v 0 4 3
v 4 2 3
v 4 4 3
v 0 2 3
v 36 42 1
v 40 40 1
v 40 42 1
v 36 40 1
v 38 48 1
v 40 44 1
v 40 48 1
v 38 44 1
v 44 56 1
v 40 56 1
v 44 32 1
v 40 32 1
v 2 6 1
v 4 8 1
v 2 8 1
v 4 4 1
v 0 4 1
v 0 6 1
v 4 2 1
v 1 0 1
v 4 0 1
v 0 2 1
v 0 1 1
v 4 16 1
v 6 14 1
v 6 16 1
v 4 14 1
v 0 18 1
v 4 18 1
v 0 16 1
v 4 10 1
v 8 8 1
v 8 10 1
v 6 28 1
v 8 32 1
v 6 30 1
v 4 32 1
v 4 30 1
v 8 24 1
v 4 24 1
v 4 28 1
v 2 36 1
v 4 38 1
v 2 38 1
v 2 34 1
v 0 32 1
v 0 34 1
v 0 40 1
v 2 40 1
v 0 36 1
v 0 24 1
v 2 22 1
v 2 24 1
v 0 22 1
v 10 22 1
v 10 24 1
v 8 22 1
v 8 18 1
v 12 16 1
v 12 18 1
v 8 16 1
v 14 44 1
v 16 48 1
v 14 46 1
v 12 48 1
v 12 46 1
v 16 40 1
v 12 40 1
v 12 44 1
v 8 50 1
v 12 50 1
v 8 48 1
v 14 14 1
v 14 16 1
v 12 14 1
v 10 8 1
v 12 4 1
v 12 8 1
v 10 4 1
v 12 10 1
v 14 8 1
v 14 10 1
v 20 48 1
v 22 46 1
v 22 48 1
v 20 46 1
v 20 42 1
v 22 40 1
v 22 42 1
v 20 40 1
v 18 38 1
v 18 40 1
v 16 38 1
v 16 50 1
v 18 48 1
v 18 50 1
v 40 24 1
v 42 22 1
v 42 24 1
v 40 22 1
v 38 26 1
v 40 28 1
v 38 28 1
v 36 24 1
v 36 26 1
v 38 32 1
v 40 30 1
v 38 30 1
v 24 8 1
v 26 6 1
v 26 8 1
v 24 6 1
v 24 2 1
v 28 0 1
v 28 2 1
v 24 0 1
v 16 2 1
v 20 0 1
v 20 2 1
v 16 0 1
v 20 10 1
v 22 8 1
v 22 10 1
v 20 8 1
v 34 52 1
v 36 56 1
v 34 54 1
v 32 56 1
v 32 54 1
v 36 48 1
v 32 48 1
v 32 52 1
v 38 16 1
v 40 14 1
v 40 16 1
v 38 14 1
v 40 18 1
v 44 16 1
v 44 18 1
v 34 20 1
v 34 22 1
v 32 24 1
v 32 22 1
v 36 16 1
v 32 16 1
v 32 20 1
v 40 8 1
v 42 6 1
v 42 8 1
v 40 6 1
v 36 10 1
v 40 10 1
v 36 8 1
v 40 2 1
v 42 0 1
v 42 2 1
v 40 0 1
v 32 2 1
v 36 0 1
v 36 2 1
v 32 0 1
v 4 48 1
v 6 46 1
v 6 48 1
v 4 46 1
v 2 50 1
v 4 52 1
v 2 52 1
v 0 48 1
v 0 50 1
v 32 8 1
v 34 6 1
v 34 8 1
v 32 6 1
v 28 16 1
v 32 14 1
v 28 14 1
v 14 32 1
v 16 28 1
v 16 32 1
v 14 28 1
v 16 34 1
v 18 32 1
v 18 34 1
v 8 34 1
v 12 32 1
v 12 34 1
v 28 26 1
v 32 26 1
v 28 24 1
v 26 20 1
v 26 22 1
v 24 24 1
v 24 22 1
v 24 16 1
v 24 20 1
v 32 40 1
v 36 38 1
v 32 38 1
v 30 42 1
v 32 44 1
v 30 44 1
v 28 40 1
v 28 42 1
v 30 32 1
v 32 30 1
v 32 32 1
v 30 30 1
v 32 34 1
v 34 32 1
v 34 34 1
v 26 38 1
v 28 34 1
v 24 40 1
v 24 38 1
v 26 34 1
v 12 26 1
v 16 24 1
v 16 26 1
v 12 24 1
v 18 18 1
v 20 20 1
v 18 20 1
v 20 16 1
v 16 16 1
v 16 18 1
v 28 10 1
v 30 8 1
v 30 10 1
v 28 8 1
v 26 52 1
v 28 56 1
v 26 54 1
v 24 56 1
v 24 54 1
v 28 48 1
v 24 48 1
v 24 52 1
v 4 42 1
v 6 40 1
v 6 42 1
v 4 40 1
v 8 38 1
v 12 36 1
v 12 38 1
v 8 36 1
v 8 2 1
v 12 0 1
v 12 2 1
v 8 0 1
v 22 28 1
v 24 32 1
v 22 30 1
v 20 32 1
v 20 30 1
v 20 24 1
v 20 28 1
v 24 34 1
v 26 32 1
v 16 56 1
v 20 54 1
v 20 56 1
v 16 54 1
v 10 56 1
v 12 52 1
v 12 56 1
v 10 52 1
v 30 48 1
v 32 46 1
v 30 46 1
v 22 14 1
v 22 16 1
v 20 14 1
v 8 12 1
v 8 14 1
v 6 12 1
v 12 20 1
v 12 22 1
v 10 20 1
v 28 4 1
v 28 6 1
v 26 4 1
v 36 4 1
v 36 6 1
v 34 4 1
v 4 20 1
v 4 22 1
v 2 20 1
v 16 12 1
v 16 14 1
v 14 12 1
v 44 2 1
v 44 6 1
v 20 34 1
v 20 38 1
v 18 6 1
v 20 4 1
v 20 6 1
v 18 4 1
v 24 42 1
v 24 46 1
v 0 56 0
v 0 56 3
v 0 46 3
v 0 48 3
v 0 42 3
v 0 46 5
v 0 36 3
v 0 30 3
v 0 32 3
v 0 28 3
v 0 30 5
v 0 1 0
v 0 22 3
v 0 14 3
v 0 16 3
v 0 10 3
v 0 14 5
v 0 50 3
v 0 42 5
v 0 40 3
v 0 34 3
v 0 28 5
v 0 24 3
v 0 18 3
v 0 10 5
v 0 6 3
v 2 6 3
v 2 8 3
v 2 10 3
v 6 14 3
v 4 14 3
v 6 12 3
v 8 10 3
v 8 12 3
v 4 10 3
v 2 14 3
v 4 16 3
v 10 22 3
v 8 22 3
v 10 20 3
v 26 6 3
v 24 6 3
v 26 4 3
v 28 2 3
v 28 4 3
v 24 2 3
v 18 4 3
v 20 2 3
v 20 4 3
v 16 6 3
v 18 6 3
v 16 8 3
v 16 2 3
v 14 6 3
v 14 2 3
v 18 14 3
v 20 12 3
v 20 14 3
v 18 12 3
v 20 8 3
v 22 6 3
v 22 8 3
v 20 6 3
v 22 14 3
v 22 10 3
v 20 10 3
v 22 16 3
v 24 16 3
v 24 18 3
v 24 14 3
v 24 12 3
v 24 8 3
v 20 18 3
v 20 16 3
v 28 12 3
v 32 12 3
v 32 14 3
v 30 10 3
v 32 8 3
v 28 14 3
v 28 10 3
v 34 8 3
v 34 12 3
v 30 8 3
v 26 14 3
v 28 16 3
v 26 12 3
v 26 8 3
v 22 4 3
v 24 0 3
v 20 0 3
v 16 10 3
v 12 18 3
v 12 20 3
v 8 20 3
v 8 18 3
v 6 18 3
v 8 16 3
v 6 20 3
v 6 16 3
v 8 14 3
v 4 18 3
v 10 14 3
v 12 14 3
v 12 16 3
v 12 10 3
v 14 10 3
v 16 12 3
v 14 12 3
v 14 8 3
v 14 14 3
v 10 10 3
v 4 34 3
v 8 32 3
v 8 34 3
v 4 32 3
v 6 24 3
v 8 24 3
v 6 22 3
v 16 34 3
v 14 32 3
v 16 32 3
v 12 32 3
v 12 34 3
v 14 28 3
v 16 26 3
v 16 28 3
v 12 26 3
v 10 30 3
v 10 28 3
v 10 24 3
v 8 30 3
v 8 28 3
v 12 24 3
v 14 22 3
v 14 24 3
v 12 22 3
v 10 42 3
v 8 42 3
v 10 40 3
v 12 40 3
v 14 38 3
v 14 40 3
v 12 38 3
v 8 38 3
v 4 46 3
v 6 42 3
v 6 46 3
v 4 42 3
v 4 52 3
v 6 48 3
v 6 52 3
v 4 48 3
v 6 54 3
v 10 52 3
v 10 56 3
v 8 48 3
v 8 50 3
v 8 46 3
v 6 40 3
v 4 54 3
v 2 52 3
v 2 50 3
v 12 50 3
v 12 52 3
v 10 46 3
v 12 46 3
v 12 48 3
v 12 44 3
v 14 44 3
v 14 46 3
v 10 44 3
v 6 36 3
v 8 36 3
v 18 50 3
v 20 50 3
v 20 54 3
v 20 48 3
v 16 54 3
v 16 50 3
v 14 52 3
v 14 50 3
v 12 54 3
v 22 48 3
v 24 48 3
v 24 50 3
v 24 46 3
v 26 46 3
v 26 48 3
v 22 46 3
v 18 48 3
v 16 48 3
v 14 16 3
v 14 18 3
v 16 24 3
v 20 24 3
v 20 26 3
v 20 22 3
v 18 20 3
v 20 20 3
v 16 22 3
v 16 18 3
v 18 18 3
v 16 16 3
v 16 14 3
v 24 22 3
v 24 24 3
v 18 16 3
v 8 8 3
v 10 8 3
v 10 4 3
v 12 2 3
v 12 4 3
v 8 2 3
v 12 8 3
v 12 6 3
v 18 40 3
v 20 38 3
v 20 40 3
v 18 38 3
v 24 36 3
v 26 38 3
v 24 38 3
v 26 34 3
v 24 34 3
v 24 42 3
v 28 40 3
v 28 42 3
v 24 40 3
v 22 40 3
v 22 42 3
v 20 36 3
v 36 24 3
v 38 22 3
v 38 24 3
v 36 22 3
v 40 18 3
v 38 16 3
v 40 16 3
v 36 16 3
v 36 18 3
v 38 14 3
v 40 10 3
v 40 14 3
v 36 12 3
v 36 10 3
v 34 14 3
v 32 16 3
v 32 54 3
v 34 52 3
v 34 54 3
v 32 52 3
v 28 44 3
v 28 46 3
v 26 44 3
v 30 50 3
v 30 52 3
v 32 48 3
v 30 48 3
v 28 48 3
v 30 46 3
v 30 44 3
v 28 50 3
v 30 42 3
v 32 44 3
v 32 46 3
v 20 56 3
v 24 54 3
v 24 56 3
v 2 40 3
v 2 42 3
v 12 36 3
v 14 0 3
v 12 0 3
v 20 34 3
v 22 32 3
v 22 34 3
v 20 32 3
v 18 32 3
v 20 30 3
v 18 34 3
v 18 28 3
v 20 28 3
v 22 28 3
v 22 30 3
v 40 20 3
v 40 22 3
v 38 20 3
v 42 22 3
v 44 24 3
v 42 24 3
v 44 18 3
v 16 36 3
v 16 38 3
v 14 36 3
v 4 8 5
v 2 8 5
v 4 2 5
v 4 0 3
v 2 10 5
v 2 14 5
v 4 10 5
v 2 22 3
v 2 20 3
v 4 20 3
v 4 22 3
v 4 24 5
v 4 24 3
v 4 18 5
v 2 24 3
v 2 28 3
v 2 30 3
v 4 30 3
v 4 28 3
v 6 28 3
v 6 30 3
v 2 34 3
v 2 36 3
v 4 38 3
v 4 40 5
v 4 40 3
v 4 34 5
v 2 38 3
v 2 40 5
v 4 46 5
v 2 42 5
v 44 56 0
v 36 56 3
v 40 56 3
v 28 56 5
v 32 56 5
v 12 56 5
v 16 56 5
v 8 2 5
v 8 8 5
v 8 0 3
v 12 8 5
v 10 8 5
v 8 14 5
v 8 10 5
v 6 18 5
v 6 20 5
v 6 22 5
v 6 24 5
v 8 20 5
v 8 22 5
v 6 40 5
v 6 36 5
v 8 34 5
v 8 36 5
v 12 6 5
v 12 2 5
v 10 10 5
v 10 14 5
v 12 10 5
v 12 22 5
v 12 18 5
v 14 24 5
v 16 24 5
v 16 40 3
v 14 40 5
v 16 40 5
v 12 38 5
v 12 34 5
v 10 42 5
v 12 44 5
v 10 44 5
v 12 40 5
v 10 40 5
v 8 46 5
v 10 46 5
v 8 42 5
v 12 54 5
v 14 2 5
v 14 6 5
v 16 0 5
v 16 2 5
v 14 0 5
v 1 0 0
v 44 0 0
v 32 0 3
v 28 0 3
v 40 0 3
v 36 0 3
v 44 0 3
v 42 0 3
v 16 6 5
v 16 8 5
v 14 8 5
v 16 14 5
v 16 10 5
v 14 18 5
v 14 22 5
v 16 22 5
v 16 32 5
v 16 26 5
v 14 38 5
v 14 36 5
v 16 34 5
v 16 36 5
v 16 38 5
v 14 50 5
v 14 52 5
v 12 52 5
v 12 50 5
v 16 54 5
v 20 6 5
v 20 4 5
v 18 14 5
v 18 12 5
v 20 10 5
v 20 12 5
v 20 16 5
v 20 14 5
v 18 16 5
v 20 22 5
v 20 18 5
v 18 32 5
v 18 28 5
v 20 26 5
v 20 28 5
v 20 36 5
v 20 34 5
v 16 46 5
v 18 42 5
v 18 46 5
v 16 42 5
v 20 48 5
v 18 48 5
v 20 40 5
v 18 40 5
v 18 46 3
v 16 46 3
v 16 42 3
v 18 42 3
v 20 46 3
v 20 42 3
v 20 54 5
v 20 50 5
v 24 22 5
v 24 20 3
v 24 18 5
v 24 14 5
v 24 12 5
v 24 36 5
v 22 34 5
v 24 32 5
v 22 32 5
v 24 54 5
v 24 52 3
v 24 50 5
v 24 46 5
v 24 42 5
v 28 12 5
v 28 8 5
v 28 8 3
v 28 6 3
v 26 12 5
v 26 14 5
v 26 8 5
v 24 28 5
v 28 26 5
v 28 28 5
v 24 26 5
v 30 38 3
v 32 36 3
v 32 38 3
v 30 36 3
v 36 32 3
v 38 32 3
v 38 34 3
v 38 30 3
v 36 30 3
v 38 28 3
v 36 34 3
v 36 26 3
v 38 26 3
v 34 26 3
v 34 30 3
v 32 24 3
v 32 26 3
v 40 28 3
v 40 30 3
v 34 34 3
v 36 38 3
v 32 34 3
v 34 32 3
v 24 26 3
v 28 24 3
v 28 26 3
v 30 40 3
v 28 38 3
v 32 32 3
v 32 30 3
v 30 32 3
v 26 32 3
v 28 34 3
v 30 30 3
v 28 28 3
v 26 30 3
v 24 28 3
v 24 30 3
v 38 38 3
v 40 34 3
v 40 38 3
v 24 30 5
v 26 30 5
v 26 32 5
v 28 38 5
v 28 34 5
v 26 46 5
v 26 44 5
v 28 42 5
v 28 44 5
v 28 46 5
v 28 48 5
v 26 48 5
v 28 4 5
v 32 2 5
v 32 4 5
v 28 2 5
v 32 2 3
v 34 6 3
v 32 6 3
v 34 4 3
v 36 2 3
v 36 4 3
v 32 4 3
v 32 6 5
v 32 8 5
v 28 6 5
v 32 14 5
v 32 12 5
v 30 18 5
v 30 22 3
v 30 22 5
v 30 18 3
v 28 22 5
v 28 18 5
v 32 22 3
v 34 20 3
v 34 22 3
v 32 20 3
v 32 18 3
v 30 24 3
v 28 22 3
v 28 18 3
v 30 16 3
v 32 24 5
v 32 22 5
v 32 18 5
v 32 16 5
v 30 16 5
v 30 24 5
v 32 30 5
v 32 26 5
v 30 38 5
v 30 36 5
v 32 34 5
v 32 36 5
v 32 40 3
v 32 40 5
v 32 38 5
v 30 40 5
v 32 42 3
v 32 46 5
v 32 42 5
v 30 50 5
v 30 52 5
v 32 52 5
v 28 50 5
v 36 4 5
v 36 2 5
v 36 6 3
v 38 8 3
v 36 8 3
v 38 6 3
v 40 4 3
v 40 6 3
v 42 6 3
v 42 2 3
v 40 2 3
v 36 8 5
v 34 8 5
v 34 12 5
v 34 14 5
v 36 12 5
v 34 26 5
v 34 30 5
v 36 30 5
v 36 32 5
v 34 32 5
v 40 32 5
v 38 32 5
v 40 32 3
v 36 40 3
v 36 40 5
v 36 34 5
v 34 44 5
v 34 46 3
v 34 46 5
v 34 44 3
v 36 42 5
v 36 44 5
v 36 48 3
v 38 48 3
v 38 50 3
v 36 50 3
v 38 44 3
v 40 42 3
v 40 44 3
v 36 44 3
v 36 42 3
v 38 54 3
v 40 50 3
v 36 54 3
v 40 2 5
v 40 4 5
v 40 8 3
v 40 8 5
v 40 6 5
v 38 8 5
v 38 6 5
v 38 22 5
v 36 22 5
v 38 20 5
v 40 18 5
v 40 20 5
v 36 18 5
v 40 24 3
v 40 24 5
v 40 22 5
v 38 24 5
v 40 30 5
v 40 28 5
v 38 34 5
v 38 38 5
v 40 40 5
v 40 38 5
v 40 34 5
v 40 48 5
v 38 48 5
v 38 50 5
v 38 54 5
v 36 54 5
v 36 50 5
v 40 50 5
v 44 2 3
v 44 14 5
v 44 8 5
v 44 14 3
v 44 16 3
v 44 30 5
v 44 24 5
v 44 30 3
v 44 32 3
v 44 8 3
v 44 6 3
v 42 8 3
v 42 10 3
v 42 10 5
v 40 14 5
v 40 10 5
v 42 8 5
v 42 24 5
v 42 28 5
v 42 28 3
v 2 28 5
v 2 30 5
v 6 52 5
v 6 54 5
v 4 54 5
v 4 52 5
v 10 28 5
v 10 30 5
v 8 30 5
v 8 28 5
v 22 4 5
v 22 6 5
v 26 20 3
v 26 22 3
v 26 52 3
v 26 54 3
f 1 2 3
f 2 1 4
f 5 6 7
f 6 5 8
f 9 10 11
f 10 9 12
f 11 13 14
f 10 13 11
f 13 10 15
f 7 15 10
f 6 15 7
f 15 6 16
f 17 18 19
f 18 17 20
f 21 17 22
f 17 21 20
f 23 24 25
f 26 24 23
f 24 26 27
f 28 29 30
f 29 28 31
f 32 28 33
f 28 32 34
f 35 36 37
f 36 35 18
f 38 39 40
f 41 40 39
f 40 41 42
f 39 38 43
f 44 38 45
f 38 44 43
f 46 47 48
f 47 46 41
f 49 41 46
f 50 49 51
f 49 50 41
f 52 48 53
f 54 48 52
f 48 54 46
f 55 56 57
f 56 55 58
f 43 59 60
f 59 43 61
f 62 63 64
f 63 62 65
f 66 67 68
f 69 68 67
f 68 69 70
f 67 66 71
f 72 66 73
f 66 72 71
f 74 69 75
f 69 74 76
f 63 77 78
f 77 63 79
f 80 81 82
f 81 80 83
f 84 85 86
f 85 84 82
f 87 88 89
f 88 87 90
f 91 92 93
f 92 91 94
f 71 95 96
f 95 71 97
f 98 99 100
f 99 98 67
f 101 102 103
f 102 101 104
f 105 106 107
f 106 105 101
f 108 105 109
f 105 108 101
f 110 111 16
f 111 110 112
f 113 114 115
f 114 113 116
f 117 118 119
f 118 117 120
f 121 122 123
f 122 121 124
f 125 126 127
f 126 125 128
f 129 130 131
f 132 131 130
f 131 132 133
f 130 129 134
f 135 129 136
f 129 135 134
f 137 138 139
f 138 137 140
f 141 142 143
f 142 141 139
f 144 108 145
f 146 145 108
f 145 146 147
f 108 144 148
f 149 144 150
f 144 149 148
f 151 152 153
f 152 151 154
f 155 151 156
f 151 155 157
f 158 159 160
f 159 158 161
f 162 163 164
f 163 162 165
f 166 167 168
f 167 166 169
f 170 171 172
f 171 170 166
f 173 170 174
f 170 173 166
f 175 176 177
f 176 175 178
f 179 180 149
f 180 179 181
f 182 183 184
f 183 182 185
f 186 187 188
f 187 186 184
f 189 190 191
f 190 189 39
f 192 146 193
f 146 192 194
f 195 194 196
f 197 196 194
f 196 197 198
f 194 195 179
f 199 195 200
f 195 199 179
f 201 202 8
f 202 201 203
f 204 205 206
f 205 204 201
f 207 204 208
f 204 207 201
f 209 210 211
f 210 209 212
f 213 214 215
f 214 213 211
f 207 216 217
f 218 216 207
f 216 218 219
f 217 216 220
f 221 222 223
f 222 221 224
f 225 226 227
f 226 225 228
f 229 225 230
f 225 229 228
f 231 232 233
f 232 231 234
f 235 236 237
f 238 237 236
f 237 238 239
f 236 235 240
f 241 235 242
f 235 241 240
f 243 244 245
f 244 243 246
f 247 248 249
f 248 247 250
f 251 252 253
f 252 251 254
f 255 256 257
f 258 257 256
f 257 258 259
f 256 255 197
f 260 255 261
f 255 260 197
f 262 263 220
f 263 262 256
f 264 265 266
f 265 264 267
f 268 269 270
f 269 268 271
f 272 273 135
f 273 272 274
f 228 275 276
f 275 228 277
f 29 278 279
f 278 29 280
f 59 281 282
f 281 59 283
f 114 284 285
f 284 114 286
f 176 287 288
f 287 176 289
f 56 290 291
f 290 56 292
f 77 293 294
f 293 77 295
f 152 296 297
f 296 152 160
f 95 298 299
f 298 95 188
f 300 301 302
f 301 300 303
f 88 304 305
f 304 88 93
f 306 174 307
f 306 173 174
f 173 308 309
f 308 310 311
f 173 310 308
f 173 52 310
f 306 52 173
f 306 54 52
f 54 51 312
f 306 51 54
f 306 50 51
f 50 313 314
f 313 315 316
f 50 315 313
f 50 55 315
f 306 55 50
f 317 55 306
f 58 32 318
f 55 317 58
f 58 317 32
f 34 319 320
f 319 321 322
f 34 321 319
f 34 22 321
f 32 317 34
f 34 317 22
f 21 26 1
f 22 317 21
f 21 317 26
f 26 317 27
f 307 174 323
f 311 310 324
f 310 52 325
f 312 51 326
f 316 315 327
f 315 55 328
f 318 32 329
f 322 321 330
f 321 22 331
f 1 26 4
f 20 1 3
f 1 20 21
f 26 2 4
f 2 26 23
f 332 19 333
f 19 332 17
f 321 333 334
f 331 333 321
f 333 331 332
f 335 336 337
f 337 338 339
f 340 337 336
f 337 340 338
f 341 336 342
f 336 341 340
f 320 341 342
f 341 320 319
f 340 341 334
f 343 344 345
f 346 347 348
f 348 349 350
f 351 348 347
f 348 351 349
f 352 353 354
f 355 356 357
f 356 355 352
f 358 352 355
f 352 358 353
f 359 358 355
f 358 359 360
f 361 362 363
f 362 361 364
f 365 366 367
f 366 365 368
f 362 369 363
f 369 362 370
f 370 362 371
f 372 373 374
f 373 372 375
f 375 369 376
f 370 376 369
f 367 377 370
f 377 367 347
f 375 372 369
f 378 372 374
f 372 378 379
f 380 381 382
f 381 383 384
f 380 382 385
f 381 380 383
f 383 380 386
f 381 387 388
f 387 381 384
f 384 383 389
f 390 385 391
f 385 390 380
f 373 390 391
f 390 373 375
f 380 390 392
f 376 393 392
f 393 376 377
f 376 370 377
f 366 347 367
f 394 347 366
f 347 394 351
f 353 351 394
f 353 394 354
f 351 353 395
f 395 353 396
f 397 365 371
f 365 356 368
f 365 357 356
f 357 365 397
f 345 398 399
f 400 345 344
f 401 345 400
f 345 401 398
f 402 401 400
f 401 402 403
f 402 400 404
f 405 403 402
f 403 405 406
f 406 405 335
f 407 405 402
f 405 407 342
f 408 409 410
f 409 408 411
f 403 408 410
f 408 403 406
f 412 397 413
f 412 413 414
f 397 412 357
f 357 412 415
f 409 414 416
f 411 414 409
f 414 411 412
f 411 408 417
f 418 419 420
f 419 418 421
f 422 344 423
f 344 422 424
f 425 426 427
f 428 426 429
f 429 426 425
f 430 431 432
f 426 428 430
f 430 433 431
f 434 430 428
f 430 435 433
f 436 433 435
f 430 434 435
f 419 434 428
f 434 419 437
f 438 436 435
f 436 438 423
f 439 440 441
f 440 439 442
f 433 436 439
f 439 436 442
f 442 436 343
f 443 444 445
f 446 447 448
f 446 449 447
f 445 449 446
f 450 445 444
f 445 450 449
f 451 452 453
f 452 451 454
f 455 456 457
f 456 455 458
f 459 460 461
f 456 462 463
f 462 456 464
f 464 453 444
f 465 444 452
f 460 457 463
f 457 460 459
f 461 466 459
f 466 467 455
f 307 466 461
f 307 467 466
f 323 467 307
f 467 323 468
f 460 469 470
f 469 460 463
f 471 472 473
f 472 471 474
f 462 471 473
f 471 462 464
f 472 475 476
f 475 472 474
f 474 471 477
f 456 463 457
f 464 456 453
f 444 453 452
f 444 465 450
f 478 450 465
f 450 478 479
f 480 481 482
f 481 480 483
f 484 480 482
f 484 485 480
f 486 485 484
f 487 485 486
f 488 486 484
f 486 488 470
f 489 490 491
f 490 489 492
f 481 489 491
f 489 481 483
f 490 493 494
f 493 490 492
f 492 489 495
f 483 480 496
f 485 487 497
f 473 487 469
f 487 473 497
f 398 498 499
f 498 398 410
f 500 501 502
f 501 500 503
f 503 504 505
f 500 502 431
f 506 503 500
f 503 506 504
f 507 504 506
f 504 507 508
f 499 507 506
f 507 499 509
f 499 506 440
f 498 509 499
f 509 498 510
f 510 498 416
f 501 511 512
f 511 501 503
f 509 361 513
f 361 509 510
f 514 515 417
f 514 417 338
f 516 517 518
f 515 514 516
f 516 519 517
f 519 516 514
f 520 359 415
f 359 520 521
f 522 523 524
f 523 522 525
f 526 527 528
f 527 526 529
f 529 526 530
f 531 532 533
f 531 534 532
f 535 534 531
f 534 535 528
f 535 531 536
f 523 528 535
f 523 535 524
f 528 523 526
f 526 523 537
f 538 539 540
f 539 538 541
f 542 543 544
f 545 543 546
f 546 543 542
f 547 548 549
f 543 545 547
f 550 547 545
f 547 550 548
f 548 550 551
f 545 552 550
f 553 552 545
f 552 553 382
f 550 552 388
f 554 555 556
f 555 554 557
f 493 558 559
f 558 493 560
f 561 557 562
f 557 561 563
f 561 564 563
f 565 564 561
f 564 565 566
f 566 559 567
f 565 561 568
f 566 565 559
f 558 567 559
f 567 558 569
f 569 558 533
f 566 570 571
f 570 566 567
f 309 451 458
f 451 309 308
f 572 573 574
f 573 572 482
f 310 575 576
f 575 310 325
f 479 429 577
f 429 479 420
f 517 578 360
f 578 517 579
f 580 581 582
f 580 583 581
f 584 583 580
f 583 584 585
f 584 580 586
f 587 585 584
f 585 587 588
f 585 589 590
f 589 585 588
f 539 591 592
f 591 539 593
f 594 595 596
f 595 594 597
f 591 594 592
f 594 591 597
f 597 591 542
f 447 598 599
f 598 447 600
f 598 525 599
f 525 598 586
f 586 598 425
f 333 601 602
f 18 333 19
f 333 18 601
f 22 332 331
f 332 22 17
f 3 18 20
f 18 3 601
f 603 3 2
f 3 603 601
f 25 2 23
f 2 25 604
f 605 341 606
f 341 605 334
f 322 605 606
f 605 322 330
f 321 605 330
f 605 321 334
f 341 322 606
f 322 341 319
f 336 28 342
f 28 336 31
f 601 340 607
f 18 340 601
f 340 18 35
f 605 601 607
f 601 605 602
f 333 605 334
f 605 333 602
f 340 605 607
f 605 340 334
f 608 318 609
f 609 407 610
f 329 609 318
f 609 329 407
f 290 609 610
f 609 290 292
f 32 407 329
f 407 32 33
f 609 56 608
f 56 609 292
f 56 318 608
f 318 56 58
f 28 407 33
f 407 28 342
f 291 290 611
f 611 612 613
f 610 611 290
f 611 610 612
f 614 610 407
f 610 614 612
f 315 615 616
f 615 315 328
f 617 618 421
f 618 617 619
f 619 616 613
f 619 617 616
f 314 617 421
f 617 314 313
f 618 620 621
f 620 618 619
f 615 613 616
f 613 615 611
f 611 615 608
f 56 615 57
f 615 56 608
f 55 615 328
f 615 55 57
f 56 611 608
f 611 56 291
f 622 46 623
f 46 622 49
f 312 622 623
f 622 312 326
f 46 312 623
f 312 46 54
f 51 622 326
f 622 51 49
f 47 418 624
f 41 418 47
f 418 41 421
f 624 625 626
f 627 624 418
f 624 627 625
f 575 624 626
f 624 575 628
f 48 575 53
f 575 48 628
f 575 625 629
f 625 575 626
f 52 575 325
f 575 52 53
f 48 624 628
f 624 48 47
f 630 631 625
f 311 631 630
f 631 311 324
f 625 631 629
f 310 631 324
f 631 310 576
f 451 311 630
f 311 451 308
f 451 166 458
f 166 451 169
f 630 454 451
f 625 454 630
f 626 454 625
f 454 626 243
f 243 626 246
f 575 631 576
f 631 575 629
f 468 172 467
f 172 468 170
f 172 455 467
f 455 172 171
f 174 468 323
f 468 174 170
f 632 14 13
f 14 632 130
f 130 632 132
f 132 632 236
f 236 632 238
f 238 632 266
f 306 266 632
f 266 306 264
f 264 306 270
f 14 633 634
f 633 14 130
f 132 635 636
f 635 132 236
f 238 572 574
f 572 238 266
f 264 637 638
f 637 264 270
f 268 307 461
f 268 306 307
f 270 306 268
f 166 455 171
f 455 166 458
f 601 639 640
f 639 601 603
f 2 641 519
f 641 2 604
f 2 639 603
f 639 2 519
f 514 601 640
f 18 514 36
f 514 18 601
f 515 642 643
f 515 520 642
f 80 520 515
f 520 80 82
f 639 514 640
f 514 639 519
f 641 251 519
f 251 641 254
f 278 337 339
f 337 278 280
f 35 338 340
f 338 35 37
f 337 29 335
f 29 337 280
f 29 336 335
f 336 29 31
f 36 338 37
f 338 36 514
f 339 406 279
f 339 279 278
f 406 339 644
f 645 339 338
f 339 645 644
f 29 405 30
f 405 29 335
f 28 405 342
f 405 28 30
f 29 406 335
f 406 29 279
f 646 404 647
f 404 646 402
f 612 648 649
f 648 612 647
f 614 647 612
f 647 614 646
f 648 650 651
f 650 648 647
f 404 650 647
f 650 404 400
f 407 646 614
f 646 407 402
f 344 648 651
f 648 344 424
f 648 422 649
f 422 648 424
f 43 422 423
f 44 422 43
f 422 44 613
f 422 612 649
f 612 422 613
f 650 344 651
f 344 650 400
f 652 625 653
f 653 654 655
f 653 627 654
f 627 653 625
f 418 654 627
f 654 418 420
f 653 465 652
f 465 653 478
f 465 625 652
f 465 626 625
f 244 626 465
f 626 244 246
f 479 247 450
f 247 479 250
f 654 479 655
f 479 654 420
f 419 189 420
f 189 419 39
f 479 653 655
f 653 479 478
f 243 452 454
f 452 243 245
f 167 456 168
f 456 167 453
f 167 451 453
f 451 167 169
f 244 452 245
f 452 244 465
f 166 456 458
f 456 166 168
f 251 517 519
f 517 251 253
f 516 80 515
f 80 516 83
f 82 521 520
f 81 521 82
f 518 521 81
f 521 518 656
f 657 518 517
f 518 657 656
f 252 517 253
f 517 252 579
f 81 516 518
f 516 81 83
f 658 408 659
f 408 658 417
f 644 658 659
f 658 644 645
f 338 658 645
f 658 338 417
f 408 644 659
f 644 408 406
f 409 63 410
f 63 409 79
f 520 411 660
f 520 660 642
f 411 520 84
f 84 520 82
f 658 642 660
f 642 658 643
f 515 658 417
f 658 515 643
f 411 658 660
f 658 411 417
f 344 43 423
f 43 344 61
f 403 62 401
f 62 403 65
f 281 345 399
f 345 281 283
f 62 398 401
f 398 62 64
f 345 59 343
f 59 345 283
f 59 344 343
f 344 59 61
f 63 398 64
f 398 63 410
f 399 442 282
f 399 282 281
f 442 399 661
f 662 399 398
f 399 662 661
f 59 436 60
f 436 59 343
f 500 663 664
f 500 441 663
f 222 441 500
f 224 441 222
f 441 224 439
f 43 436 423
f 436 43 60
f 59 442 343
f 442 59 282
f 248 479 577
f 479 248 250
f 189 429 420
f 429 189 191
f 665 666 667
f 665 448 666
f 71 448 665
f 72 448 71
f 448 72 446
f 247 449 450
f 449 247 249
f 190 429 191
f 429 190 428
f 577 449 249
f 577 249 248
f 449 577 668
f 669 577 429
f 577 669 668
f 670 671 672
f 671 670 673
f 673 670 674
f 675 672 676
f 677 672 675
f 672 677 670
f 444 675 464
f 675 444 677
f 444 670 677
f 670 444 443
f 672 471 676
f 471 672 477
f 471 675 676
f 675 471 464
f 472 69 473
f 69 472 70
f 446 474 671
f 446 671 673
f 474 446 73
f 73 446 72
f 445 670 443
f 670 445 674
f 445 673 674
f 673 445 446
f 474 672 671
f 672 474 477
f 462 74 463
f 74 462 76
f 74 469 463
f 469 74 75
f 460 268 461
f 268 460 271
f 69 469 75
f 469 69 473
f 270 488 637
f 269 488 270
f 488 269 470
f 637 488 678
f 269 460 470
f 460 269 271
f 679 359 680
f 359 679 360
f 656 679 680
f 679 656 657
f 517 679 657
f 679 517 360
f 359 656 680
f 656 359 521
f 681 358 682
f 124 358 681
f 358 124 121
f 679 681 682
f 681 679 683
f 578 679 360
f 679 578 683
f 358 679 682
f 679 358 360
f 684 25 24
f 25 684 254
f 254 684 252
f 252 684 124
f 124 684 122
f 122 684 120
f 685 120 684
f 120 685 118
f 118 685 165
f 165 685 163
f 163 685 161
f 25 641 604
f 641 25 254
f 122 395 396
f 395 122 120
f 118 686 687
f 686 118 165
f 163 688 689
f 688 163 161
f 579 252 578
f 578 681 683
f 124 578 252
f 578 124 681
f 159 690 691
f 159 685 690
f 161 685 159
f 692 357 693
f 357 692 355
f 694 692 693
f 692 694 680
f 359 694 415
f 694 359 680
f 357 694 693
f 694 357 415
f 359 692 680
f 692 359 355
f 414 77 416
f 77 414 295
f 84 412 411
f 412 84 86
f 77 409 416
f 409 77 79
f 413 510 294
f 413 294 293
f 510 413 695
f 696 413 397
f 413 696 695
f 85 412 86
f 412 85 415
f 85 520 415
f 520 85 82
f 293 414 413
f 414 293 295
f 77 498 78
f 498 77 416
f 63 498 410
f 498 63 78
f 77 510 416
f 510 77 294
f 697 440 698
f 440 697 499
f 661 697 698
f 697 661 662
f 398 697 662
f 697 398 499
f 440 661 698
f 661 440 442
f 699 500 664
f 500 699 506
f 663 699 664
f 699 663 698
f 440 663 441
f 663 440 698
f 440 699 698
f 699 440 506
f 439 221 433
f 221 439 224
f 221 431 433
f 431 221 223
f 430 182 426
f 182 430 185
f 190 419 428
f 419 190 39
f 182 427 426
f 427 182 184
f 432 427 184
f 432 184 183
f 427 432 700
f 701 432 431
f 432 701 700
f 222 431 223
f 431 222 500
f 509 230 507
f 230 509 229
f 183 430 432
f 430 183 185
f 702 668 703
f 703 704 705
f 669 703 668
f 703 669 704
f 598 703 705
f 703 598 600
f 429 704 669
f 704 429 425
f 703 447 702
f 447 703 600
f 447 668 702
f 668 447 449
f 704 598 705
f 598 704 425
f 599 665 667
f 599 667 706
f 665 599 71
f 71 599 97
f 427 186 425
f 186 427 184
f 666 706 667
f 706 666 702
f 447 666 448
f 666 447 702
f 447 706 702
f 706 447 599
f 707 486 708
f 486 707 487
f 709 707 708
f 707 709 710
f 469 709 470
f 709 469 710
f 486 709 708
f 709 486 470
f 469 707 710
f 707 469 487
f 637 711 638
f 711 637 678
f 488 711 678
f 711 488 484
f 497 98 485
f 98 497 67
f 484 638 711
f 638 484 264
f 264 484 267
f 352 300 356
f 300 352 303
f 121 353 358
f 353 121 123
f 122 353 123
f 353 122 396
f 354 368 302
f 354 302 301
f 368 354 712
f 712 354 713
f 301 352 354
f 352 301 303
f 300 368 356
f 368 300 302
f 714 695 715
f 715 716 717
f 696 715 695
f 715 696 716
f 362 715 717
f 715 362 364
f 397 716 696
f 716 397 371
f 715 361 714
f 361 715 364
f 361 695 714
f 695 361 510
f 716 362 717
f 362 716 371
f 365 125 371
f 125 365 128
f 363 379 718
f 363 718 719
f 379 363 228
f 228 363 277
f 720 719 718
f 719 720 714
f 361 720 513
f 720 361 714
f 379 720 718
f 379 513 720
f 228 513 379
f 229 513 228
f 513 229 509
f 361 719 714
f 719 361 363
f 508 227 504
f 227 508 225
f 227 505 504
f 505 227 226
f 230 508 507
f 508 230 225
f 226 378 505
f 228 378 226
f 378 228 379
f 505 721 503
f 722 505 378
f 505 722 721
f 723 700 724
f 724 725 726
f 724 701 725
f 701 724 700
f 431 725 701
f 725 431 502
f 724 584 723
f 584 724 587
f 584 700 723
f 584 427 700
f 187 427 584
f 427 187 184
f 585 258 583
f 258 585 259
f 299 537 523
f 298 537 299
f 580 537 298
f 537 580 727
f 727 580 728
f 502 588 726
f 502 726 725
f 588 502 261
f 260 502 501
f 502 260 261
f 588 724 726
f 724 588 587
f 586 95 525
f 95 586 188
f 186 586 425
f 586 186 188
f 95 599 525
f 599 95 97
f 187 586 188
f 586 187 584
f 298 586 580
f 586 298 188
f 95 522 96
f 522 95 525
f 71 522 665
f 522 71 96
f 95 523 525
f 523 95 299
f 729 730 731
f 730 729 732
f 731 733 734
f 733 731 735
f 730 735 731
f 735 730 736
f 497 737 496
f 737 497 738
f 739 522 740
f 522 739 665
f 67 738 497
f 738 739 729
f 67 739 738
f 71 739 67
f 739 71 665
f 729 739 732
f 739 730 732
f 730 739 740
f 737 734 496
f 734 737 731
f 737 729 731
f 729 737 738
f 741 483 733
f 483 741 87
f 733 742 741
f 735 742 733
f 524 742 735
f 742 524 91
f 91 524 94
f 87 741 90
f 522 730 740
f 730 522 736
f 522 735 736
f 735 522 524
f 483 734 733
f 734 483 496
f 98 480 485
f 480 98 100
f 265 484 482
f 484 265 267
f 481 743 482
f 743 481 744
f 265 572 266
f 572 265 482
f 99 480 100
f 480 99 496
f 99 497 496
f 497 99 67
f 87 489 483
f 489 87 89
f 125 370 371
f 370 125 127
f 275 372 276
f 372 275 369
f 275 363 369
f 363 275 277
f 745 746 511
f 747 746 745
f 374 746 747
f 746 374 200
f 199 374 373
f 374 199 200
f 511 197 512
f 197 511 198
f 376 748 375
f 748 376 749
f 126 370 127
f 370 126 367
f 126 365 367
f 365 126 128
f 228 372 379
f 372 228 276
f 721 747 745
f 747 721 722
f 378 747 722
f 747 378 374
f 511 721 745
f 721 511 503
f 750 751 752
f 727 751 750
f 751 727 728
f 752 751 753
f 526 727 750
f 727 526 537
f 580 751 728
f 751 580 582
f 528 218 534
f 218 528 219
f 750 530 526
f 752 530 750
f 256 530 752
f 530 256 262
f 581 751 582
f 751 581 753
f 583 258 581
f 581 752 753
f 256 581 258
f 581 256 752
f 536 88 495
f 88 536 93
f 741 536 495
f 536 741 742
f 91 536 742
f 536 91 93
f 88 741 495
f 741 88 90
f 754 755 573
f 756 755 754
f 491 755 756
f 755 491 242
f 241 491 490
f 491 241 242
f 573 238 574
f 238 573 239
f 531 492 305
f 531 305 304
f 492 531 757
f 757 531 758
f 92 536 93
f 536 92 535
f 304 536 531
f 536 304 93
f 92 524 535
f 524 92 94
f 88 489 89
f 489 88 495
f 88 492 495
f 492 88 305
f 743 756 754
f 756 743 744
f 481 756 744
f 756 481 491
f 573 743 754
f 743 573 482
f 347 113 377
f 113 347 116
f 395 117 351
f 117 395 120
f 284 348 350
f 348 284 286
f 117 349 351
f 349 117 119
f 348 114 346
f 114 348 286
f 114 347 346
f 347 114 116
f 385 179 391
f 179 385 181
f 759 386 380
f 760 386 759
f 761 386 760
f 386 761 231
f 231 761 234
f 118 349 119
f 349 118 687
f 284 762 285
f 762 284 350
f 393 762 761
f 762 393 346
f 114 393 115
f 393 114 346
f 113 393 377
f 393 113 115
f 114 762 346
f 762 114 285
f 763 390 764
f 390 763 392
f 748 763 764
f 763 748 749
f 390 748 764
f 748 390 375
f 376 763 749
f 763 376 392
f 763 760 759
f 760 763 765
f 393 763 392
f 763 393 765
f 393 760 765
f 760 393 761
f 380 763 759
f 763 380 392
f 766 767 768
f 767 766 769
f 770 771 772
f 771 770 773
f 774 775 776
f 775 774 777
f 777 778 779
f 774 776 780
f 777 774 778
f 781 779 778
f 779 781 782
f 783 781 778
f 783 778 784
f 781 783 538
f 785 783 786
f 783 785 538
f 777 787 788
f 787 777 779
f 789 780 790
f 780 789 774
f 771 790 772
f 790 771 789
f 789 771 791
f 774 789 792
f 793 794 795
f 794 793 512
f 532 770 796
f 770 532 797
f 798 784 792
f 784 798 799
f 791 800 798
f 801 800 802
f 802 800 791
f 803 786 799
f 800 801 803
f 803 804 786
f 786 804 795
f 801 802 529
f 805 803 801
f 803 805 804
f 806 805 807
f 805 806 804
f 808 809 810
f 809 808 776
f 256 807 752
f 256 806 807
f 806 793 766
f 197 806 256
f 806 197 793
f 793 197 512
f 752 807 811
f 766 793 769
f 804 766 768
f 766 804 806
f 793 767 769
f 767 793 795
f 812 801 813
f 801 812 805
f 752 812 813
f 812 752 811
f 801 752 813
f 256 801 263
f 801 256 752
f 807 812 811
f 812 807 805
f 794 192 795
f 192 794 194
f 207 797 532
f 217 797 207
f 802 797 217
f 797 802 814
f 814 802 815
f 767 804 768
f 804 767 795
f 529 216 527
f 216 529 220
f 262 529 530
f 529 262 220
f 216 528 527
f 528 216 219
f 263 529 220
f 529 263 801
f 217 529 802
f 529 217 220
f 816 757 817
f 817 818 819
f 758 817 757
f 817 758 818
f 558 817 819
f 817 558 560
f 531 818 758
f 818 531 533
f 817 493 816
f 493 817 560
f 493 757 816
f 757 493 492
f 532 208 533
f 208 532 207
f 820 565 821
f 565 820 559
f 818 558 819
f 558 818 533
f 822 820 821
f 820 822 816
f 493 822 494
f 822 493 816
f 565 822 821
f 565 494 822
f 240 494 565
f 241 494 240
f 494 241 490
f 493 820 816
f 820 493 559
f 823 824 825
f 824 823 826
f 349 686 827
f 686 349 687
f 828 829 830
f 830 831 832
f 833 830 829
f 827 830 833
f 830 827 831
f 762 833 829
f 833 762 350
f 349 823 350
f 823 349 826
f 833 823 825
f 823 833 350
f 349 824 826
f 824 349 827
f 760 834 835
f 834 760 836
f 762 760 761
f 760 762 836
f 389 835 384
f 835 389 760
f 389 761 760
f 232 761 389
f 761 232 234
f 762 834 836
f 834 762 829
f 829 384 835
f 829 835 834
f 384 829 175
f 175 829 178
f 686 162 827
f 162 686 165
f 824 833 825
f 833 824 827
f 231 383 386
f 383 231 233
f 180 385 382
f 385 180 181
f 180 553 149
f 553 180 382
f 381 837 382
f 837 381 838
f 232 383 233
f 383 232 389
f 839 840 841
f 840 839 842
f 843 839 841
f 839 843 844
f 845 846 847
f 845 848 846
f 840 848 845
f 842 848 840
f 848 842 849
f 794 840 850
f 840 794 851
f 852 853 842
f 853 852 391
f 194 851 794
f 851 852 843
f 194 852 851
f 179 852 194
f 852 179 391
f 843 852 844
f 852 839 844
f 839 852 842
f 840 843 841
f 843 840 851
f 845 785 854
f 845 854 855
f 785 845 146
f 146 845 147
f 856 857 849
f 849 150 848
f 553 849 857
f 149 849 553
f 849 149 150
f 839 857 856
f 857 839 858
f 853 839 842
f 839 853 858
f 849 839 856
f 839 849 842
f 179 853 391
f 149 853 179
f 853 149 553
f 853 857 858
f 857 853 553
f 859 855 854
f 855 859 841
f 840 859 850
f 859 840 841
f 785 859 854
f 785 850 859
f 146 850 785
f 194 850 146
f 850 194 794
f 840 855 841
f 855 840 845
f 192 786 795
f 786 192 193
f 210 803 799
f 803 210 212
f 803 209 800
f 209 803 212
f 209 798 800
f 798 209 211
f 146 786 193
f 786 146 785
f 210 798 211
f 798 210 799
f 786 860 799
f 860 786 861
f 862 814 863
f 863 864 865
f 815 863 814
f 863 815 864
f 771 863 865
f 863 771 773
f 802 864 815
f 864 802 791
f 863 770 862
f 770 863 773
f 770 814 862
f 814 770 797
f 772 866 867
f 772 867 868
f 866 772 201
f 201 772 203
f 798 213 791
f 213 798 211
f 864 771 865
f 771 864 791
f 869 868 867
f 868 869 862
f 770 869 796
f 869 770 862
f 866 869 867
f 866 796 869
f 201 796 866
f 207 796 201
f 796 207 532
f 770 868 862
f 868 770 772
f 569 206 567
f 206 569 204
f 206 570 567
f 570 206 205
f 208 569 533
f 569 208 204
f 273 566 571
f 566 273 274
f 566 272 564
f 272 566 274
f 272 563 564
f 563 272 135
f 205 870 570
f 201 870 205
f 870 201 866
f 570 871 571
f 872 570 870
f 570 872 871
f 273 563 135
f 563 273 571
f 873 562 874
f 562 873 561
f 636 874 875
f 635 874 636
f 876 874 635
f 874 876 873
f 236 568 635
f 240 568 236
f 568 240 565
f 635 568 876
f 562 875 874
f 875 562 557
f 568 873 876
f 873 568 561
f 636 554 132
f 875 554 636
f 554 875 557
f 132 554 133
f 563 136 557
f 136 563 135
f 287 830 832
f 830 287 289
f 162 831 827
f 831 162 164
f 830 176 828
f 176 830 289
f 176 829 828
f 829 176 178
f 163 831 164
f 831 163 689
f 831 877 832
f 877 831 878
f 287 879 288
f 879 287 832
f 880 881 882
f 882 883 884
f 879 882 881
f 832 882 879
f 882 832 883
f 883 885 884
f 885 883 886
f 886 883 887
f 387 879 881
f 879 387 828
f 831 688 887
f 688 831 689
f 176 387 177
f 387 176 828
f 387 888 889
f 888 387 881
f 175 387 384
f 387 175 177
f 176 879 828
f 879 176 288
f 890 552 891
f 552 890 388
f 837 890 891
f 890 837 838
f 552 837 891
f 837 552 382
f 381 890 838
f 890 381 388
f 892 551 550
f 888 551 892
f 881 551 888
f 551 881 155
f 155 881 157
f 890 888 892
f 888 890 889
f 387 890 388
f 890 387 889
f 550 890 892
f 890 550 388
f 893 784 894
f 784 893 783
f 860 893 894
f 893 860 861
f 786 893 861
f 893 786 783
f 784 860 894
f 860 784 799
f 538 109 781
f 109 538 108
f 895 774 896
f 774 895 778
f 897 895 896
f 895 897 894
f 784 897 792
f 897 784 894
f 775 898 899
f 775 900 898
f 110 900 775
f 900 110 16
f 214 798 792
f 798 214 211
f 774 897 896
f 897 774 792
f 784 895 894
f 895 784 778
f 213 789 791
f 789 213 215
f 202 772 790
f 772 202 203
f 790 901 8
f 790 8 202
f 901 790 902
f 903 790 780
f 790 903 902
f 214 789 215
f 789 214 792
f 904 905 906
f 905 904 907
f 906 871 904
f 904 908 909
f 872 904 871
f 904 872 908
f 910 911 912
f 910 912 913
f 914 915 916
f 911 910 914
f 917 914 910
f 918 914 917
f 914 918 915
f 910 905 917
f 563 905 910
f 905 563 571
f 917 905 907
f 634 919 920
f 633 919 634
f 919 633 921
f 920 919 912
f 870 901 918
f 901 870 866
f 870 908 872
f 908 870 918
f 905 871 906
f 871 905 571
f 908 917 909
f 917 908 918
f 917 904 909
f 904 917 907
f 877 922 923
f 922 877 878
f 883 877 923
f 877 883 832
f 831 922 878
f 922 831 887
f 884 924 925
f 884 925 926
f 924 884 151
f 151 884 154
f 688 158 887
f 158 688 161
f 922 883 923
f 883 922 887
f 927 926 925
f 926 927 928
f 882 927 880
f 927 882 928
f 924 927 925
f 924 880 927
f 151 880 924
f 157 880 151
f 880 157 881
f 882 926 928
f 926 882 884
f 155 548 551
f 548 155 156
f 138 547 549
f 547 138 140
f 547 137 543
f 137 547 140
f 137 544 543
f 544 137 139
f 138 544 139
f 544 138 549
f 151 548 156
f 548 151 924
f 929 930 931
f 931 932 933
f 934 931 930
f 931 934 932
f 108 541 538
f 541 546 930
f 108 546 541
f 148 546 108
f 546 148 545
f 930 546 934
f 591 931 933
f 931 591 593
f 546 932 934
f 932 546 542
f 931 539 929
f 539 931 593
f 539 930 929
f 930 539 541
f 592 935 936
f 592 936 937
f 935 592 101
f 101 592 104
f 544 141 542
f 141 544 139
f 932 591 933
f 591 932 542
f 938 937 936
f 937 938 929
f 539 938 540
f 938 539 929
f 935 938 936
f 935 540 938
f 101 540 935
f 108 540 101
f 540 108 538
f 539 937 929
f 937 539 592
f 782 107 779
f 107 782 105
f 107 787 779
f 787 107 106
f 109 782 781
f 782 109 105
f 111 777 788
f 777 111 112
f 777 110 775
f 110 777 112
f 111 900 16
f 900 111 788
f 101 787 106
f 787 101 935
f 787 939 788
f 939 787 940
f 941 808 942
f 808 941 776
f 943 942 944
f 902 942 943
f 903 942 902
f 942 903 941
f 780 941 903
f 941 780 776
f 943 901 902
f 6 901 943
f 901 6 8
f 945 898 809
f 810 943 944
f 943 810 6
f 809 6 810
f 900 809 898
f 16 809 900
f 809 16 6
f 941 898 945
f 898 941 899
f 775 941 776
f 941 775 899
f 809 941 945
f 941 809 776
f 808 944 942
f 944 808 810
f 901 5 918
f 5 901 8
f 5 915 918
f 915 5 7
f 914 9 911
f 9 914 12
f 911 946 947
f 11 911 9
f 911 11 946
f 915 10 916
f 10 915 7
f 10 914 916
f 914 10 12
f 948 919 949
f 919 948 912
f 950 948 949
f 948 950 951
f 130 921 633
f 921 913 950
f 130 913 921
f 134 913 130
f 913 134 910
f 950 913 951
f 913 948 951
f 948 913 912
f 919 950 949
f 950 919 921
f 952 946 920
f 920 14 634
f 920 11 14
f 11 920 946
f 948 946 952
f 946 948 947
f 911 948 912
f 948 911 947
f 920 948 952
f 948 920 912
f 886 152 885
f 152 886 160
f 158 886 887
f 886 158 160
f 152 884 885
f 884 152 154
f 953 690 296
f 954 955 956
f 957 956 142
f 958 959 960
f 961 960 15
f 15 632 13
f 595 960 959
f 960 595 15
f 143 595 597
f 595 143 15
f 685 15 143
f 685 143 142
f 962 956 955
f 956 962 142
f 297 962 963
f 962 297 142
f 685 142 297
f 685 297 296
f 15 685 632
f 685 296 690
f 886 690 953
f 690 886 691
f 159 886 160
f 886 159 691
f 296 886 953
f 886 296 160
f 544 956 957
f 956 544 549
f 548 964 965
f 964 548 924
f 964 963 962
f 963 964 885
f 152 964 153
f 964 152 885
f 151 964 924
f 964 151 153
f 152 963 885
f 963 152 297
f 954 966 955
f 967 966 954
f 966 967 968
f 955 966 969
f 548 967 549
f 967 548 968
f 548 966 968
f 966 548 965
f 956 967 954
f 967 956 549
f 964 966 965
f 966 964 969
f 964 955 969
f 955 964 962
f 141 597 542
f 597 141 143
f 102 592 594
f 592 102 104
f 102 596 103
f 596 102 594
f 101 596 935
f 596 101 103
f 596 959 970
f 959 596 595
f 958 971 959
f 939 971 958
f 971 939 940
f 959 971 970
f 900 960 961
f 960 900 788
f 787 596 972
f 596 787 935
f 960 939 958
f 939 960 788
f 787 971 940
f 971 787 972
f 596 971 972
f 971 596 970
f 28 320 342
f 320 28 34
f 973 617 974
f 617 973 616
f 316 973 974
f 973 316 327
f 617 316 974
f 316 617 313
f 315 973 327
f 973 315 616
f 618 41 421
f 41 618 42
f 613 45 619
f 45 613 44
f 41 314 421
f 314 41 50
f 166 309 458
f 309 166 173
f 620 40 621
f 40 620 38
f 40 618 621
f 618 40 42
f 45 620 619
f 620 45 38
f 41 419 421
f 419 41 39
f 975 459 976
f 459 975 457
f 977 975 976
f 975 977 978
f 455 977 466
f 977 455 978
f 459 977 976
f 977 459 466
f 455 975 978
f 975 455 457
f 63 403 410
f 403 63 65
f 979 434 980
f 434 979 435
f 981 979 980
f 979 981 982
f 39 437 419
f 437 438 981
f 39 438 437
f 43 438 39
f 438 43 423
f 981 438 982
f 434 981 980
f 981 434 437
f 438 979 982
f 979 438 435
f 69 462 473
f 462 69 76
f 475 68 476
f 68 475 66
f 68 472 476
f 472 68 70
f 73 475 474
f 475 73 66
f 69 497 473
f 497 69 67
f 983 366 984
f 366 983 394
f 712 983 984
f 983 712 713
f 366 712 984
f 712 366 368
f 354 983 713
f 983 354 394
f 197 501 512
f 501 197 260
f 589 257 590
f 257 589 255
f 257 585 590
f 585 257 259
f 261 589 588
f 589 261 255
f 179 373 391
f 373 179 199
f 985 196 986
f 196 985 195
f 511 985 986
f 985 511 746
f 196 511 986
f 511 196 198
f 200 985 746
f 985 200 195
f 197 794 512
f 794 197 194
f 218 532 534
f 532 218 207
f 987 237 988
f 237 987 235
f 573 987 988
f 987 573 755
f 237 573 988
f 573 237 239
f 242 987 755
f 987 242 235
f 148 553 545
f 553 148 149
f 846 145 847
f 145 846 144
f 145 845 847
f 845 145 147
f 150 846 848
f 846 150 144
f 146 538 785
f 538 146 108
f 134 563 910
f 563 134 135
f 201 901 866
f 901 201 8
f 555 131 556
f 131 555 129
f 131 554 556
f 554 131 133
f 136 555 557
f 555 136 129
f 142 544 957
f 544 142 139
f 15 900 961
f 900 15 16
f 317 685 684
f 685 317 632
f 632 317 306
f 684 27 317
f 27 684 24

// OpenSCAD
/**
 * Binary Tile is is a physical representation of binary data.
 *
 * Byte representation:
 * [0][1][2][3]
 * [4][5][6][7]
 *
 * Creator: Hristo Iankov
 **/


// The message to reresent as binary.
message = "The Answer to the Ultimate Question of Life, The Universe, and Everything.";

// The size of each bit (in mm).
bit_s = 2; // [0.5:0.5:8]

// Generate a binary tile with the given message and bit size.
module binary_tile(message, bit_s) {
    difference() {
        print_tile(message, bit_s);
        print_indicator(bit_s);
        //print_key(message);
    }
}

// create the tile
module print_tile(message, bit_s) {
    N = len(message);
    byte_w = bit_s * 4;
    byte_h = bit_s * 2;
    byte_cols = ceil(sqrt(N/2));
    byte_rows = ceil(N / byte_cols);
    w = byte_cols * byte_w;
    h = byte_rows * byte_h;
    union() {
        cube([h, w, 1]);
        echo(str("size (in mm): ", w, , " x ", h, ", N: ", N));
        for (i = [0:N]) {
            byte_c = (i % byte_cols);
            byte_r = floor(i / byte_cols);
            byte_x = byte_c * byte_w;
            byte_y = byte_r * byte_h;
            height = (!(isEven(byte_c) == isEven(byte_r))) ? 1 + bit_s : 1;
            //height = 1;
            translate([byte_y, byte_x, height]) {
                create_byte(ord(message[i]), bit_s);
            }
            if (height > 1) {
                translate([byte_y, byte_x, 1]) {
                    cube([2*bit_s, 4*bit_s, bit_s]);
                }
            }
        }
    }
}

// create first byte indicator
module print_indicator(bit_s) {
    translate([-bit_s/4,-bit_s/4,-1]) {
        linear_extrude(height=1+bit_s+1, false) {
            polygon([[0,0], [0, bit_s], [bit_s,0]]);
        }
    }
}

// deprecated: prints a key at the bottom of the tile.
module print_key(message) {
    font_size = 2;
    N = len(message);
    linear_extrude(0.4) {
        union() {
            translate([4, font_size * 7,0]) {
                rotate([0,180,90]) {
                    text("[0][1][2][3]", font_size);
                    translate([0, -font_size-1, 0]) {
                        text("[4][5][6][7]", font_size);
                    }
                    translate([0, (-font_size-1) * 2, 0]) {
                        text(str(N), font_size);
                    }
                }
            }
        }
    }
}

// create a single byte
module create_byte(byte, bit_s) {
    //echo("byte", byte);
    for (i = [0:7]) {
        //echo("bit: ", i, " val: ", getBit(byte, i));
        if (getBit(byte, (7 - i)) == 1) {
            bit_x = floor(i % 4) * bit_s;
            bit_y = floor(i / 4) * bit_s;
            translate([bit_y, bit_x]) {
                cube([bit_s, bit_s, bit_s]);
            }
        }
    }
}

function isEven(number) = floor(number % 2) == 0;

function getBit(byte, i) = floor((byte / pow(2, i)) % 2);

function ord(char) = ascii(char, 0);

function ascii(char, i) = i > 255 ? -1 
    : (char == chr(i)) ? i : ascii(char, i+1);

binary_tile(message, bit_s);
